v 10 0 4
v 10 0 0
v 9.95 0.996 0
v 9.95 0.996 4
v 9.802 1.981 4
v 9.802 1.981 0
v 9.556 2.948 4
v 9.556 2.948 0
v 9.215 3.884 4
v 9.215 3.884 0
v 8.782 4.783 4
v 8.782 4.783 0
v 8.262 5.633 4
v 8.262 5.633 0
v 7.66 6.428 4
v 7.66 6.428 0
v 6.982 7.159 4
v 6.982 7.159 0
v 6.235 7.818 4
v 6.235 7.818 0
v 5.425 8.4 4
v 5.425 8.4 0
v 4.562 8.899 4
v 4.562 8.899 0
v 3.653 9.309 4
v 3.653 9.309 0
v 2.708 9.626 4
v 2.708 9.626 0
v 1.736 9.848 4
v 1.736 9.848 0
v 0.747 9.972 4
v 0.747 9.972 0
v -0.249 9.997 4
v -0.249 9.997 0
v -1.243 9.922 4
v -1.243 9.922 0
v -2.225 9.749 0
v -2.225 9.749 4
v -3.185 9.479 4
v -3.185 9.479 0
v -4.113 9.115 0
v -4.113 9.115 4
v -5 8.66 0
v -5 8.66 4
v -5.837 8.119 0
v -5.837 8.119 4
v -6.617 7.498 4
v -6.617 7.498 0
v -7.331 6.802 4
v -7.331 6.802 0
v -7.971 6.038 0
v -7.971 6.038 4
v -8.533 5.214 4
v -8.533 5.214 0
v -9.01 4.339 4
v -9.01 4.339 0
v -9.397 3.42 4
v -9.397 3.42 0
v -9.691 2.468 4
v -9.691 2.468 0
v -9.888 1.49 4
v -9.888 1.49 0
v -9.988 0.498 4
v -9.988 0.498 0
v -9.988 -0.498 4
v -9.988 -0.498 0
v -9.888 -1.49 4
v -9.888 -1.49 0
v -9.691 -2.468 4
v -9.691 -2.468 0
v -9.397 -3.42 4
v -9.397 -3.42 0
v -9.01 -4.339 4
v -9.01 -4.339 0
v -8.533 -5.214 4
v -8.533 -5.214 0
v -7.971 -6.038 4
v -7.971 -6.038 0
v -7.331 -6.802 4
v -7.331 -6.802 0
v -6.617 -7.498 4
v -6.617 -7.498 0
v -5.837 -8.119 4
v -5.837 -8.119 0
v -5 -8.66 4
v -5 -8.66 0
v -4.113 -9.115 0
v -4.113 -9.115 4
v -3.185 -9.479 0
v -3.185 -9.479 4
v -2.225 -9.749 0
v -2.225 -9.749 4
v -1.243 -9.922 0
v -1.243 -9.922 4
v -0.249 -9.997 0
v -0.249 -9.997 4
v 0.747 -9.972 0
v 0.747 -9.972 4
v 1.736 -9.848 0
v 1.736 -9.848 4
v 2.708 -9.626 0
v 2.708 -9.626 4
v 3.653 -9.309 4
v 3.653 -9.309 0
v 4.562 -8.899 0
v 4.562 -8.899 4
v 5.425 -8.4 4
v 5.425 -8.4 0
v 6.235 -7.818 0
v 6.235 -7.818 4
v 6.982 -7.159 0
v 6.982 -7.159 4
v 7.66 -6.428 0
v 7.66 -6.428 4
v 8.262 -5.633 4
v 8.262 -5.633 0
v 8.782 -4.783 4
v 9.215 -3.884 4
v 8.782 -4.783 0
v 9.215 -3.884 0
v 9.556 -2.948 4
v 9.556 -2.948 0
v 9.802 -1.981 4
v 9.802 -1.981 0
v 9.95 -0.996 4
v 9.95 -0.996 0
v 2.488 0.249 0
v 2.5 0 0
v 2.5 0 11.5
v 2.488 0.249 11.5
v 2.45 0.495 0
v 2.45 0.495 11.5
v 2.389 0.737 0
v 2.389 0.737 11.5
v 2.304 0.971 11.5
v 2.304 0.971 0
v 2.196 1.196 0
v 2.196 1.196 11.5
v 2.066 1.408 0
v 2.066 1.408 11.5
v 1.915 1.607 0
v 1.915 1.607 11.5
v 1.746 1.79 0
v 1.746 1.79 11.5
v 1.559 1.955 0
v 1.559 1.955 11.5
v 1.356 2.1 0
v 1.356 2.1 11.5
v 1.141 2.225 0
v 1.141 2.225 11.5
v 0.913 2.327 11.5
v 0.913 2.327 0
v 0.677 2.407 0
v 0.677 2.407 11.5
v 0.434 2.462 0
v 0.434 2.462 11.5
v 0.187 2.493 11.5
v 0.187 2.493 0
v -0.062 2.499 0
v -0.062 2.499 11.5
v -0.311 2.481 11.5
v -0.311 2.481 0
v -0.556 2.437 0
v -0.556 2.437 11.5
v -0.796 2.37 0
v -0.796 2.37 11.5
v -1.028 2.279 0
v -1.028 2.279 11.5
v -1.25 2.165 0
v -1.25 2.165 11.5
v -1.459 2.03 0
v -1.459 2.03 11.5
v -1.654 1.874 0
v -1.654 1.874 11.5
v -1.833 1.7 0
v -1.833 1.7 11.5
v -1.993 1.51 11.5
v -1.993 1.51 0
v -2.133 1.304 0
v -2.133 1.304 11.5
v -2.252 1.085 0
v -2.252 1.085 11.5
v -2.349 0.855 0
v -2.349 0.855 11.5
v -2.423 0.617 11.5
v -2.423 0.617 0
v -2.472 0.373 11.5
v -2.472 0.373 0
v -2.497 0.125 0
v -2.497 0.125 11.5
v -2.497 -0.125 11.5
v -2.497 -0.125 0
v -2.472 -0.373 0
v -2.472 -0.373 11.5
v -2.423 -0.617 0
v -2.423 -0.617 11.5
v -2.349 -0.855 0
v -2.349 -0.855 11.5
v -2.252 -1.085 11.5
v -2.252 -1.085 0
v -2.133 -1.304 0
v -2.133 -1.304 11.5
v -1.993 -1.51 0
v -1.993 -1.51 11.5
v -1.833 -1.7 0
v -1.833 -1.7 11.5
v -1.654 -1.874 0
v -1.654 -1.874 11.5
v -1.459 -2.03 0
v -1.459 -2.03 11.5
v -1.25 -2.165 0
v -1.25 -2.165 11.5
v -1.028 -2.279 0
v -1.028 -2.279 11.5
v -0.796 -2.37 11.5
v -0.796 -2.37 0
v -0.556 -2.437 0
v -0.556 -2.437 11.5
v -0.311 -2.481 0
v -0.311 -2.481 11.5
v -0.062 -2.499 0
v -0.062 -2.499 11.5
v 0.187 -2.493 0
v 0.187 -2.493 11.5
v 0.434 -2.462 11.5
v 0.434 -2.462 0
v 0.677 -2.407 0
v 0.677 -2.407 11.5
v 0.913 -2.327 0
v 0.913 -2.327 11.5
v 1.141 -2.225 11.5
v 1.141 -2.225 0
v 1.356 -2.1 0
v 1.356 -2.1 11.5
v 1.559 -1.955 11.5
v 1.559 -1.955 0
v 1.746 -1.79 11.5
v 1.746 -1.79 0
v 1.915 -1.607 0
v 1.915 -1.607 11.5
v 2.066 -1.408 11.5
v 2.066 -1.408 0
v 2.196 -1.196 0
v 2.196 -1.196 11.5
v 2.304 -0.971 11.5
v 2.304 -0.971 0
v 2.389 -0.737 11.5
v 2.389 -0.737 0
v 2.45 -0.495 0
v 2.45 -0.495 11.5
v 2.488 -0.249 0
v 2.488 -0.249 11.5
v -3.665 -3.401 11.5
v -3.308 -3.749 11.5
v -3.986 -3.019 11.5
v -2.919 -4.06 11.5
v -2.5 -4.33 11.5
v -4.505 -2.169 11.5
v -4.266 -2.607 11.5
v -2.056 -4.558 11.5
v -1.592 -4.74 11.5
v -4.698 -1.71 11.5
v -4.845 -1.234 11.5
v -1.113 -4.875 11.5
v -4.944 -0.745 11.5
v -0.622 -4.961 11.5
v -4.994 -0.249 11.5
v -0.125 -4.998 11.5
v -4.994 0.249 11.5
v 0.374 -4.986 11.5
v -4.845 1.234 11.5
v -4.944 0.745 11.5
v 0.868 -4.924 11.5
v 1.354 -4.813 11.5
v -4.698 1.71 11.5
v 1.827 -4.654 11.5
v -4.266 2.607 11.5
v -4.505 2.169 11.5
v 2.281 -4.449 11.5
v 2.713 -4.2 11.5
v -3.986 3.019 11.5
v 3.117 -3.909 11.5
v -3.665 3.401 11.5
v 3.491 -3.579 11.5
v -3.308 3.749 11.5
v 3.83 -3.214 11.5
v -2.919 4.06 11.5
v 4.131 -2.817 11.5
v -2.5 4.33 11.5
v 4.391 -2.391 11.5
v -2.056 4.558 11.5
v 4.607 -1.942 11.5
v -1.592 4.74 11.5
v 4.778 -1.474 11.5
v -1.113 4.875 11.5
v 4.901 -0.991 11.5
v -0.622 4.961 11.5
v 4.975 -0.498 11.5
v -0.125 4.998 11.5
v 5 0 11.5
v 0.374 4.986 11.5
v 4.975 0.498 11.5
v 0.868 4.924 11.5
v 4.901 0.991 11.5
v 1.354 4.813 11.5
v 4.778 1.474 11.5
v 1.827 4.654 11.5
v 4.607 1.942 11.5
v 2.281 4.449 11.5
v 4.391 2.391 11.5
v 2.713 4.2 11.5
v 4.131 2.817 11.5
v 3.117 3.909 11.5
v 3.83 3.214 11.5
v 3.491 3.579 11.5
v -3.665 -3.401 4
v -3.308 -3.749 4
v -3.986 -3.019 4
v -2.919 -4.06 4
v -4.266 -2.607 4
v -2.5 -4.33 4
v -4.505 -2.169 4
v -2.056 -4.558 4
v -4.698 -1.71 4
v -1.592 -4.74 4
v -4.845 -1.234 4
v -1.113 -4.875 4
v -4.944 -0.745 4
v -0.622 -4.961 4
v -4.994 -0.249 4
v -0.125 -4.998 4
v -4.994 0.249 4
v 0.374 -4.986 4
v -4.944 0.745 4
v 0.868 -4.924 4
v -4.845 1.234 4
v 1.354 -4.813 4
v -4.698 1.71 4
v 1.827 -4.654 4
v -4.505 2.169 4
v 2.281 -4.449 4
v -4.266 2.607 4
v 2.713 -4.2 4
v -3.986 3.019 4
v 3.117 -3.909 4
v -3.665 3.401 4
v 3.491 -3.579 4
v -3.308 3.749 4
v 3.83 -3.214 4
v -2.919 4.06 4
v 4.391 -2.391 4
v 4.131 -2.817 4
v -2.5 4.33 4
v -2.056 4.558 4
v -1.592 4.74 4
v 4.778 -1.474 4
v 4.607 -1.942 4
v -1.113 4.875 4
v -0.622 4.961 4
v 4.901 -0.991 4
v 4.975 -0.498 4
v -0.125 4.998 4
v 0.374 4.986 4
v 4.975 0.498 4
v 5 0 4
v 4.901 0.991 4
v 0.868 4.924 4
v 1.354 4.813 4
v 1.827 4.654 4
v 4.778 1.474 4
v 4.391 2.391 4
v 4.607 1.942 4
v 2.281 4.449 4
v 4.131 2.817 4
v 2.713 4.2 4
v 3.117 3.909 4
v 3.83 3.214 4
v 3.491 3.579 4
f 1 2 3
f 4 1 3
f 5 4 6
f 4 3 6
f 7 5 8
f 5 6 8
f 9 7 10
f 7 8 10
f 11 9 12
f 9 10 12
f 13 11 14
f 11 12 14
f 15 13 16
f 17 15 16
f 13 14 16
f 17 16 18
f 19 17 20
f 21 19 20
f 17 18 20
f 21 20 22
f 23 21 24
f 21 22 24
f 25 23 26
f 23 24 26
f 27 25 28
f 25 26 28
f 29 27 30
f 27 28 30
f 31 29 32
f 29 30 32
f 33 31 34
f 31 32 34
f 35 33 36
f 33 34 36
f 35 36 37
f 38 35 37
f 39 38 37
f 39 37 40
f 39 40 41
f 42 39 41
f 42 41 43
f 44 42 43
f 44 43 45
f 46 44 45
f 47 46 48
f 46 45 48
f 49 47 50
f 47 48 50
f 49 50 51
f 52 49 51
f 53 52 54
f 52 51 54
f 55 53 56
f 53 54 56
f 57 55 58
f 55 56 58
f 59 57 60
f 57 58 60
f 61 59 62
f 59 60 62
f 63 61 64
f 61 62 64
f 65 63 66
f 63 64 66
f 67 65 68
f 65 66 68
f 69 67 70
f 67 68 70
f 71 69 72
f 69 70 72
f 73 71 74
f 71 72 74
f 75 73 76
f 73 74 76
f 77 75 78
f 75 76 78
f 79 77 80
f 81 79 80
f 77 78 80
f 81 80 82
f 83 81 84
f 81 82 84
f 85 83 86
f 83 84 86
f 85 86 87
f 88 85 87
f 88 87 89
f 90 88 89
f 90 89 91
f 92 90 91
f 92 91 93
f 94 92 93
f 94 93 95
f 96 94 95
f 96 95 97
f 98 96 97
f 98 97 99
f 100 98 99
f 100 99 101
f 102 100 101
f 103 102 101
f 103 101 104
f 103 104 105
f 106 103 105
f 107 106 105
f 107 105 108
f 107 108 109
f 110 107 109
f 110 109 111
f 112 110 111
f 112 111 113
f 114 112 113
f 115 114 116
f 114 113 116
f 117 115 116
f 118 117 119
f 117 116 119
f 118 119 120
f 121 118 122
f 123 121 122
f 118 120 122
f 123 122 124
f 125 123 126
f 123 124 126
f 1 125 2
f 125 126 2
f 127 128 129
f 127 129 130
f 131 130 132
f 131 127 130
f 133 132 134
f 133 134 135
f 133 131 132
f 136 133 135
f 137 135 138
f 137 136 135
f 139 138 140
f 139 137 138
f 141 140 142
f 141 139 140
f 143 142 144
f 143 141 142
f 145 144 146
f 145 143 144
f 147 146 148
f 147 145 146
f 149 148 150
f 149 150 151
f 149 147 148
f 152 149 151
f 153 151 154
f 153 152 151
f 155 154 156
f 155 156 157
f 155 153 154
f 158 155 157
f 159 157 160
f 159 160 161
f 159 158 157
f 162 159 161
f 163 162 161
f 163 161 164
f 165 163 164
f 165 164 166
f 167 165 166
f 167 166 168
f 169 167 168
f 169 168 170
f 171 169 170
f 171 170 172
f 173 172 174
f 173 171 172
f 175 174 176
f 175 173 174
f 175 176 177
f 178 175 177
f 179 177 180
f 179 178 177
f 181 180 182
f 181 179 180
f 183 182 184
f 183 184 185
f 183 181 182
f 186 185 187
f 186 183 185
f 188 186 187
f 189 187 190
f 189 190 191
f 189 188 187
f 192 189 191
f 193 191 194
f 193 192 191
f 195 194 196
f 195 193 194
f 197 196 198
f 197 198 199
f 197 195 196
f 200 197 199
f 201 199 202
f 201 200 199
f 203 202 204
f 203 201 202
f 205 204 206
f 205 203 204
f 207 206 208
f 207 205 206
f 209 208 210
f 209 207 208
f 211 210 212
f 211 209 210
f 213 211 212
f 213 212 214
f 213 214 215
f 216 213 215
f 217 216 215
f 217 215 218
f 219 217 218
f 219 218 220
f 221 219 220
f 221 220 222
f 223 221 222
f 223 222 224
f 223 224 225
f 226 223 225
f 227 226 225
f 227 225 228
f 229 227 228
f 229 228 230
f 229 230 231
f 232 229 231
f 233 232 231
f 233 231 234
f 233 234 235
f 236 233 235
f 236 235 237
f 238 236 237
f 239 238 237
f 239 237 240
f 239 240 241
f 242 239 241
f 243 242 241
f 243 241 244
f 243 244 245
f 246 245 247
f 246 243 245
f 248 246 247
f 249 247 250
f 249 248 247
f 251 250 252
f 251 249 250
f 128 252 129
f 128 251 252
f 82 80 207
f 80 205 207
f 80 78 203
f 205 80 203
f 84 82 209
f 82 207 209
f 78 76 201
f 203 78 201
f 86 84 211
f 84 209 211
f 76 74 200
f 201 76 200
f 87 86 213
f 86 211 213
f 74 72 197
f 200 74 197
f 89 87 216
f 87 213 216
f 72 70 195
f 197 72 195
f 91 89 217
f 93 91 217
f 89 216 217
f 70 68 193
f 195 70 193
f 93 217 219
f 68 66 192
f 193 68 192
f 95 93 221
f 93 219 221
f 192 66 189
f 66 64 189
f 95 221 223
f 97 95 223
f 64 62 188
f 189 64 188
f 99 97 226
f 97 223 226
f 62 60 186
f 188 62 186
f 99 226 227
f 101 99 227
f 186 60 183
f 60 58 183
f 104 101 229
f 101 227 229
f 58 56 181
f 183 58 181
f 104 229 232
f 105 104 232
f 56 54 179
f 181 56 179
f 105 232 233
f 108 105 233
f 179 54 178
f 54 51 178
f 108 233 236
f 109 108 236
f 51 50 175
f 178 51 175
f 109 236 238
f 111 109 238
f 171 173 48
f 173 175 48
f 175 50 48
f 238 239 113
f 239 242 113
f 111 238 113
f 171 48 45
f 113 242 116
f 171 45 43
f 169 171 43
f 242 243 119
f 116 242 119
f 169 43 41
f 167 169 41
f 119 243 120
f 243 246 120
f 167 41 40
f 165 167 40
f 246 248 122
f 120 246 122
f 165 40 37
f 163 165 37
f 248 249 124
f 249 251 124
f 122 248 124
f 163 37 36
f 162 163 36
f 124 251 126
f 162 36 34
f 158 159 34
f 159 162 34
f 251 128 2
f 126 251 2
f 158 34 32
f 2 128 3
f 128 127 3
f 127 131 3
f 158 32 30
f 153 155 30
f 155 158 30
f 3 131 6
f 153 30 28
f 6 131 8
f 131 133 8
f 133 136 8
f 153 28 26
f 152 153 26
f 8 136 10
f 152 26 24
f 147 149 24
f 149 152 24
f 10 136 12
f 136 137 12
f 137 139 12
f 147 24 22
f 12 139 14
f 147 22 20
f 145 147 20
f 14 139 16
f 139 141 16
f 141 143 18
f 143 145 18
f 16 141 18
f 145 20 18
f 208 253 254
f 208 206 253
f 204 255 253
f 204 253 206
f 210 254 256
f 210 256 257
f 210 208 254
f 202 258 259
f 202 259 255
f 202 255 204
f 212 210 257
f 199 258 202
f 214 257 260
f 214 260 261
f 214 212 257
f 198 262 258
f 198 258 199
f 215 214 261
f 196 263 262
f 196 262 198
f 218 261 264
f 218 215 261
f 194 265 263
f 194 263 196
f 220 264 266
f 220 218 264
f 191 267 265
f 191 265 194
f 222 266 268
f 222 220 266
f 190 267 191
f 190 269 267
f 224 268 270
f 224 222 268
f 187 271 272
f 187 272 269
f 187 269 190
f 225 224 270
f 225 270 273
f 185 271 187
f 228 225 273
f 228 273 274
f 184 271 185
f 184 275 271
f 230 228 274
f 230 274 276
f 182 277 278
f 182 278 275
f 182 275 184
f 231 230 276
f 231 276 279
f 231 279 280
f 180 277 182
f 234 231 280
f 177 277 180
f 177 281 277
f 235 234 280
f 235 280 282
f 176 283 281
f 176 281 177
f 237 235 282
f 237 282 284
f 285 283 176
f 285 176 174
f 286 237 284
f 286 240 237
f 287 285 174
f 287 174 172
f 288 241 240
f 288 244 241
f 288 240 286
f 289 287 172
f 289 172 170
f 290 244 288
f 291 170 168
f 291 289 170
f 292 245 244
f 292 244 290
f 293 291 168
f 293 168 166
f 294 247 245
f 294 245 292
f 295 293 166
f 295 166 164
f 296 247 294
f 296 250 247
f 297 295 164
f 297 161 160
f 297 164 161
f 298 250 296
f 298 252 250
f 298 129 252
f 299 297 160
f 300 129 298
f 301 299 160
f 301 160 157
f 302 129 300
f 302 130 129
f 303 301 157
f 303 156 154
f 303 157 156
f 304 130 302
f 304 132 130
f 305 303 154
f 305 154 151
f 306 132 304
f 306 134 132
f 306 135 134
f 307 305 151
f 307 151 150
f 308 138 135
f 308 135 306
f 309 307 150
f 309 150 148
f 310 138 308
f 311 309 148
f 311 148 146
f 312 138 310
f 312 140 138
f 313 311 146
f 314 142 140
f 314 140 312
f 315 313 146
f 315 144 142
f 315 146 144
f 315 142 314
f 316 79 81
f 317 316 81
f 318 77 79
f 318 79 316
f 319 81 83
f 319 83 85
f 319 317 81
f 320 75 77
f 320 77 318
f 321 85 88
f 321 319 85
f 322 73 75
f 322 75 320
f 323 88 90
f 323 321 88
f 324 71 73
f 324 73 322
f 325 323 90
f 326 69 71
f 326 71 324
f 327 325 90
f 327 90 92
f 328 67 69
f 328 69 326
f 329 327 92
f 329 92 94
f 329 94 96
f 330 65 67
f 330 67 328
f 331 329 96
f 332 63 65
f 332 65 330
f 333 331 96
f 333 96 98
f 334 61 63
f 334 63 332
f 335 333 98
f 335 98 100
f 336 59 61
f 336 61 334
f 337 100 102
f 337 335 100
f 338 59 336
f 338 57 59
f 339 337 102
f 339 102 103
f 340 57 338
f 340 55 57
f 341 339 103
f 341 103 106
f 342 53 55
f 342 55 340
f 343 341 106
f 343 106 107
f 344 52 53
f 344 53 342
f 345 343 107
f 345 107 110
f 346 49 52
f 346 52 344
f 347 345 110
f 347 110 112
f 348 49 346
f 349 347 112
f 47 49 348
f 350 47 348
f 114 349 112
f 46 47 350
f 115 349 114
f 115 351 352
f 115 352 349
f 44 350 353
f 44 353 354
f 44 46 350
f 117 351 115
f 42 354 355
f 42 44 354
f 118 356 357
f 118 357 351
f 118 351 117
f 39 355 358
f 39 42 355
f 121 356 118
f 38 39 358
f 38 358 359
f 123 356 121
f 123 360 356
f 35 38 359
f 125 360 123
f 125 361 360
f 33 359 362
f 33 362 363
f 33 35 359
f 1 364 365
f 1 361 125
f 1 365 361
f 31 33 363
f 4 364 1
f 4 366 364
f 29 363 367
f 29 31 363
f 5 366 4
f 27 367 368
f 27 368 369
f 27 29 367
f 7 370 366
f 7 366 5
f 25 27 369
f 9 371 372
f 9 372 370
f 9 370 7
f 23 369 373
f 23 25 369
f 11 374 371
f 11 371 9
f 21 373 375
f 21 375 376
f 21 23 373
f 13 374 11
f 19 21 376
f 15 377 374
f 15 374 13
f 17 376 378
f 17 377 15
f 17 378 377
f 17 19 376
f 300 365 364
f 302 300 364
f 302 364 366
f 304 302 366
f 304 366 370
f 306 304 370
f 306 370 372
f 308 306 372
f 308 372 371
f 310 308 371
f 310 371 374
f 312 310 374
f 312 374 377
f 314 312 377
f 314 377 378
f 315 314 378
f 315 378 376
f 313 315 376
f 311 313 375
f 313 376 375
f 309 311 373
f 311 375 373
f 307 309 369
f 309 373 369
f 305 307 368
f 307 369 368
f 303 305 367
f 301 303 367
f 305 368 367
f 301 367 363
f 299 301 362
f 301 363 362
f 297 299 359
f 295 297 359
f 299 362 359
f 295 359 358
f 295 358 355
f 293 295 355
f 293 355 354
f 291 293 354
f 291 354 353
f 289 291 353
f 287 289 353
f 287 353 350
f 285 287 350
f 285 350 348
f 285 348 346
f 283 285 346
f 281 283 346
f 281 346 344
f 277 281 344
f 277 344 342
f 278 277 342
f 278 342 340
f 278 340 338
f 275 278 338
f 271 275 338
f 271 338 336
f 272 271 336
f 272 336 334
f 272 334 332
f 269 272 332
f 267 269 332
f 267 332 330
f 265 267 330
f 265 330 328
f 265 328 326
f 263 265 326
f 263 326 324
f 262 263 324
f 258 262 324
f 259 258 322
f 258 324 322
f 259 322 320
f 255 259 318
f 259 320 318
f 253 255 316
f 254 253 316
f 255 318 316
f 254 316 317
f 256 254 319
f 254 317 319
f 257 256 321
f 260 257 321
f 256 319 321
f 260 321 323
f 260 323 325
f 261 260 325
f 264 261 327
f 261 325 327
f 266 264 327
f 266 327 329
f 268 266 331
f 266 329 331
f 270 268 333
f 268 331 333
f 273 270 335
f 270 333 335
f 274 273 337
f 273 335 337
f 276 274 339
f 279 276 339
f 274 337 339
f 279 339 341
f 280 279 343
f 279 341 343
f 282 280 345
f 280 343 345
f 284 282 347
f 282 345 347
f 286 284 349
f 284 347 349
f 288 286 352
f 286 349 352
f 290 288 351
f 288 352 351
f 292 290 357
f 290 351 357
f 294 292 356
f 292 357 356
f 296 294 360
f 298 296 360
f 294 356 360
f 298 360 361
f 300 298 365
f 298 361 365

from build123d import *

# Parameters (mm, degrees)
CYLINDER003_R     = 2.5
CYLINDER003_DEPTH = 11.5
CYLINDER022_R     = 5
CYLINDER022_DEPTH = 11.5
CYLINDER002_R     = 10
CYLINDER002_DEPTH = 4


with BuildPart() as cylinder003:
    # Cylinder003 → Cylinder003 (new body)
    with BuildSketch(Plane.XY):
        Circle(CYLINDER003_R)
    extrude(amount=CYLINDER003_DEPTH)


with BuildPart() as cylinder022:
    # Cylinder022 → Cylinder022 (new body)
    with BuildSketch(Plane.XY):
        Circle(CYLINDER022_R)
    extrude(amount=CYLINDER022_DEPTH)


with BuildPart() as r_ndelmutter_m5_hohe_form_din466:
    # Cylinder002 → Cylinder002 (new body)
    with BuildSketch(Plane.XY):
        Circle(CYLINDER002_R)
    extrude(amount=CYLINDER002_DEPTH)

    # Fusion001018017021: union Cylinder022
    add(cylinder022.part)

    # Cut: cut Cylinder003
    add(cylinder003.part, mode=Mode.SUBTRACT)


solid = r_ndelmutter_m5_hohe_form_din466.part
